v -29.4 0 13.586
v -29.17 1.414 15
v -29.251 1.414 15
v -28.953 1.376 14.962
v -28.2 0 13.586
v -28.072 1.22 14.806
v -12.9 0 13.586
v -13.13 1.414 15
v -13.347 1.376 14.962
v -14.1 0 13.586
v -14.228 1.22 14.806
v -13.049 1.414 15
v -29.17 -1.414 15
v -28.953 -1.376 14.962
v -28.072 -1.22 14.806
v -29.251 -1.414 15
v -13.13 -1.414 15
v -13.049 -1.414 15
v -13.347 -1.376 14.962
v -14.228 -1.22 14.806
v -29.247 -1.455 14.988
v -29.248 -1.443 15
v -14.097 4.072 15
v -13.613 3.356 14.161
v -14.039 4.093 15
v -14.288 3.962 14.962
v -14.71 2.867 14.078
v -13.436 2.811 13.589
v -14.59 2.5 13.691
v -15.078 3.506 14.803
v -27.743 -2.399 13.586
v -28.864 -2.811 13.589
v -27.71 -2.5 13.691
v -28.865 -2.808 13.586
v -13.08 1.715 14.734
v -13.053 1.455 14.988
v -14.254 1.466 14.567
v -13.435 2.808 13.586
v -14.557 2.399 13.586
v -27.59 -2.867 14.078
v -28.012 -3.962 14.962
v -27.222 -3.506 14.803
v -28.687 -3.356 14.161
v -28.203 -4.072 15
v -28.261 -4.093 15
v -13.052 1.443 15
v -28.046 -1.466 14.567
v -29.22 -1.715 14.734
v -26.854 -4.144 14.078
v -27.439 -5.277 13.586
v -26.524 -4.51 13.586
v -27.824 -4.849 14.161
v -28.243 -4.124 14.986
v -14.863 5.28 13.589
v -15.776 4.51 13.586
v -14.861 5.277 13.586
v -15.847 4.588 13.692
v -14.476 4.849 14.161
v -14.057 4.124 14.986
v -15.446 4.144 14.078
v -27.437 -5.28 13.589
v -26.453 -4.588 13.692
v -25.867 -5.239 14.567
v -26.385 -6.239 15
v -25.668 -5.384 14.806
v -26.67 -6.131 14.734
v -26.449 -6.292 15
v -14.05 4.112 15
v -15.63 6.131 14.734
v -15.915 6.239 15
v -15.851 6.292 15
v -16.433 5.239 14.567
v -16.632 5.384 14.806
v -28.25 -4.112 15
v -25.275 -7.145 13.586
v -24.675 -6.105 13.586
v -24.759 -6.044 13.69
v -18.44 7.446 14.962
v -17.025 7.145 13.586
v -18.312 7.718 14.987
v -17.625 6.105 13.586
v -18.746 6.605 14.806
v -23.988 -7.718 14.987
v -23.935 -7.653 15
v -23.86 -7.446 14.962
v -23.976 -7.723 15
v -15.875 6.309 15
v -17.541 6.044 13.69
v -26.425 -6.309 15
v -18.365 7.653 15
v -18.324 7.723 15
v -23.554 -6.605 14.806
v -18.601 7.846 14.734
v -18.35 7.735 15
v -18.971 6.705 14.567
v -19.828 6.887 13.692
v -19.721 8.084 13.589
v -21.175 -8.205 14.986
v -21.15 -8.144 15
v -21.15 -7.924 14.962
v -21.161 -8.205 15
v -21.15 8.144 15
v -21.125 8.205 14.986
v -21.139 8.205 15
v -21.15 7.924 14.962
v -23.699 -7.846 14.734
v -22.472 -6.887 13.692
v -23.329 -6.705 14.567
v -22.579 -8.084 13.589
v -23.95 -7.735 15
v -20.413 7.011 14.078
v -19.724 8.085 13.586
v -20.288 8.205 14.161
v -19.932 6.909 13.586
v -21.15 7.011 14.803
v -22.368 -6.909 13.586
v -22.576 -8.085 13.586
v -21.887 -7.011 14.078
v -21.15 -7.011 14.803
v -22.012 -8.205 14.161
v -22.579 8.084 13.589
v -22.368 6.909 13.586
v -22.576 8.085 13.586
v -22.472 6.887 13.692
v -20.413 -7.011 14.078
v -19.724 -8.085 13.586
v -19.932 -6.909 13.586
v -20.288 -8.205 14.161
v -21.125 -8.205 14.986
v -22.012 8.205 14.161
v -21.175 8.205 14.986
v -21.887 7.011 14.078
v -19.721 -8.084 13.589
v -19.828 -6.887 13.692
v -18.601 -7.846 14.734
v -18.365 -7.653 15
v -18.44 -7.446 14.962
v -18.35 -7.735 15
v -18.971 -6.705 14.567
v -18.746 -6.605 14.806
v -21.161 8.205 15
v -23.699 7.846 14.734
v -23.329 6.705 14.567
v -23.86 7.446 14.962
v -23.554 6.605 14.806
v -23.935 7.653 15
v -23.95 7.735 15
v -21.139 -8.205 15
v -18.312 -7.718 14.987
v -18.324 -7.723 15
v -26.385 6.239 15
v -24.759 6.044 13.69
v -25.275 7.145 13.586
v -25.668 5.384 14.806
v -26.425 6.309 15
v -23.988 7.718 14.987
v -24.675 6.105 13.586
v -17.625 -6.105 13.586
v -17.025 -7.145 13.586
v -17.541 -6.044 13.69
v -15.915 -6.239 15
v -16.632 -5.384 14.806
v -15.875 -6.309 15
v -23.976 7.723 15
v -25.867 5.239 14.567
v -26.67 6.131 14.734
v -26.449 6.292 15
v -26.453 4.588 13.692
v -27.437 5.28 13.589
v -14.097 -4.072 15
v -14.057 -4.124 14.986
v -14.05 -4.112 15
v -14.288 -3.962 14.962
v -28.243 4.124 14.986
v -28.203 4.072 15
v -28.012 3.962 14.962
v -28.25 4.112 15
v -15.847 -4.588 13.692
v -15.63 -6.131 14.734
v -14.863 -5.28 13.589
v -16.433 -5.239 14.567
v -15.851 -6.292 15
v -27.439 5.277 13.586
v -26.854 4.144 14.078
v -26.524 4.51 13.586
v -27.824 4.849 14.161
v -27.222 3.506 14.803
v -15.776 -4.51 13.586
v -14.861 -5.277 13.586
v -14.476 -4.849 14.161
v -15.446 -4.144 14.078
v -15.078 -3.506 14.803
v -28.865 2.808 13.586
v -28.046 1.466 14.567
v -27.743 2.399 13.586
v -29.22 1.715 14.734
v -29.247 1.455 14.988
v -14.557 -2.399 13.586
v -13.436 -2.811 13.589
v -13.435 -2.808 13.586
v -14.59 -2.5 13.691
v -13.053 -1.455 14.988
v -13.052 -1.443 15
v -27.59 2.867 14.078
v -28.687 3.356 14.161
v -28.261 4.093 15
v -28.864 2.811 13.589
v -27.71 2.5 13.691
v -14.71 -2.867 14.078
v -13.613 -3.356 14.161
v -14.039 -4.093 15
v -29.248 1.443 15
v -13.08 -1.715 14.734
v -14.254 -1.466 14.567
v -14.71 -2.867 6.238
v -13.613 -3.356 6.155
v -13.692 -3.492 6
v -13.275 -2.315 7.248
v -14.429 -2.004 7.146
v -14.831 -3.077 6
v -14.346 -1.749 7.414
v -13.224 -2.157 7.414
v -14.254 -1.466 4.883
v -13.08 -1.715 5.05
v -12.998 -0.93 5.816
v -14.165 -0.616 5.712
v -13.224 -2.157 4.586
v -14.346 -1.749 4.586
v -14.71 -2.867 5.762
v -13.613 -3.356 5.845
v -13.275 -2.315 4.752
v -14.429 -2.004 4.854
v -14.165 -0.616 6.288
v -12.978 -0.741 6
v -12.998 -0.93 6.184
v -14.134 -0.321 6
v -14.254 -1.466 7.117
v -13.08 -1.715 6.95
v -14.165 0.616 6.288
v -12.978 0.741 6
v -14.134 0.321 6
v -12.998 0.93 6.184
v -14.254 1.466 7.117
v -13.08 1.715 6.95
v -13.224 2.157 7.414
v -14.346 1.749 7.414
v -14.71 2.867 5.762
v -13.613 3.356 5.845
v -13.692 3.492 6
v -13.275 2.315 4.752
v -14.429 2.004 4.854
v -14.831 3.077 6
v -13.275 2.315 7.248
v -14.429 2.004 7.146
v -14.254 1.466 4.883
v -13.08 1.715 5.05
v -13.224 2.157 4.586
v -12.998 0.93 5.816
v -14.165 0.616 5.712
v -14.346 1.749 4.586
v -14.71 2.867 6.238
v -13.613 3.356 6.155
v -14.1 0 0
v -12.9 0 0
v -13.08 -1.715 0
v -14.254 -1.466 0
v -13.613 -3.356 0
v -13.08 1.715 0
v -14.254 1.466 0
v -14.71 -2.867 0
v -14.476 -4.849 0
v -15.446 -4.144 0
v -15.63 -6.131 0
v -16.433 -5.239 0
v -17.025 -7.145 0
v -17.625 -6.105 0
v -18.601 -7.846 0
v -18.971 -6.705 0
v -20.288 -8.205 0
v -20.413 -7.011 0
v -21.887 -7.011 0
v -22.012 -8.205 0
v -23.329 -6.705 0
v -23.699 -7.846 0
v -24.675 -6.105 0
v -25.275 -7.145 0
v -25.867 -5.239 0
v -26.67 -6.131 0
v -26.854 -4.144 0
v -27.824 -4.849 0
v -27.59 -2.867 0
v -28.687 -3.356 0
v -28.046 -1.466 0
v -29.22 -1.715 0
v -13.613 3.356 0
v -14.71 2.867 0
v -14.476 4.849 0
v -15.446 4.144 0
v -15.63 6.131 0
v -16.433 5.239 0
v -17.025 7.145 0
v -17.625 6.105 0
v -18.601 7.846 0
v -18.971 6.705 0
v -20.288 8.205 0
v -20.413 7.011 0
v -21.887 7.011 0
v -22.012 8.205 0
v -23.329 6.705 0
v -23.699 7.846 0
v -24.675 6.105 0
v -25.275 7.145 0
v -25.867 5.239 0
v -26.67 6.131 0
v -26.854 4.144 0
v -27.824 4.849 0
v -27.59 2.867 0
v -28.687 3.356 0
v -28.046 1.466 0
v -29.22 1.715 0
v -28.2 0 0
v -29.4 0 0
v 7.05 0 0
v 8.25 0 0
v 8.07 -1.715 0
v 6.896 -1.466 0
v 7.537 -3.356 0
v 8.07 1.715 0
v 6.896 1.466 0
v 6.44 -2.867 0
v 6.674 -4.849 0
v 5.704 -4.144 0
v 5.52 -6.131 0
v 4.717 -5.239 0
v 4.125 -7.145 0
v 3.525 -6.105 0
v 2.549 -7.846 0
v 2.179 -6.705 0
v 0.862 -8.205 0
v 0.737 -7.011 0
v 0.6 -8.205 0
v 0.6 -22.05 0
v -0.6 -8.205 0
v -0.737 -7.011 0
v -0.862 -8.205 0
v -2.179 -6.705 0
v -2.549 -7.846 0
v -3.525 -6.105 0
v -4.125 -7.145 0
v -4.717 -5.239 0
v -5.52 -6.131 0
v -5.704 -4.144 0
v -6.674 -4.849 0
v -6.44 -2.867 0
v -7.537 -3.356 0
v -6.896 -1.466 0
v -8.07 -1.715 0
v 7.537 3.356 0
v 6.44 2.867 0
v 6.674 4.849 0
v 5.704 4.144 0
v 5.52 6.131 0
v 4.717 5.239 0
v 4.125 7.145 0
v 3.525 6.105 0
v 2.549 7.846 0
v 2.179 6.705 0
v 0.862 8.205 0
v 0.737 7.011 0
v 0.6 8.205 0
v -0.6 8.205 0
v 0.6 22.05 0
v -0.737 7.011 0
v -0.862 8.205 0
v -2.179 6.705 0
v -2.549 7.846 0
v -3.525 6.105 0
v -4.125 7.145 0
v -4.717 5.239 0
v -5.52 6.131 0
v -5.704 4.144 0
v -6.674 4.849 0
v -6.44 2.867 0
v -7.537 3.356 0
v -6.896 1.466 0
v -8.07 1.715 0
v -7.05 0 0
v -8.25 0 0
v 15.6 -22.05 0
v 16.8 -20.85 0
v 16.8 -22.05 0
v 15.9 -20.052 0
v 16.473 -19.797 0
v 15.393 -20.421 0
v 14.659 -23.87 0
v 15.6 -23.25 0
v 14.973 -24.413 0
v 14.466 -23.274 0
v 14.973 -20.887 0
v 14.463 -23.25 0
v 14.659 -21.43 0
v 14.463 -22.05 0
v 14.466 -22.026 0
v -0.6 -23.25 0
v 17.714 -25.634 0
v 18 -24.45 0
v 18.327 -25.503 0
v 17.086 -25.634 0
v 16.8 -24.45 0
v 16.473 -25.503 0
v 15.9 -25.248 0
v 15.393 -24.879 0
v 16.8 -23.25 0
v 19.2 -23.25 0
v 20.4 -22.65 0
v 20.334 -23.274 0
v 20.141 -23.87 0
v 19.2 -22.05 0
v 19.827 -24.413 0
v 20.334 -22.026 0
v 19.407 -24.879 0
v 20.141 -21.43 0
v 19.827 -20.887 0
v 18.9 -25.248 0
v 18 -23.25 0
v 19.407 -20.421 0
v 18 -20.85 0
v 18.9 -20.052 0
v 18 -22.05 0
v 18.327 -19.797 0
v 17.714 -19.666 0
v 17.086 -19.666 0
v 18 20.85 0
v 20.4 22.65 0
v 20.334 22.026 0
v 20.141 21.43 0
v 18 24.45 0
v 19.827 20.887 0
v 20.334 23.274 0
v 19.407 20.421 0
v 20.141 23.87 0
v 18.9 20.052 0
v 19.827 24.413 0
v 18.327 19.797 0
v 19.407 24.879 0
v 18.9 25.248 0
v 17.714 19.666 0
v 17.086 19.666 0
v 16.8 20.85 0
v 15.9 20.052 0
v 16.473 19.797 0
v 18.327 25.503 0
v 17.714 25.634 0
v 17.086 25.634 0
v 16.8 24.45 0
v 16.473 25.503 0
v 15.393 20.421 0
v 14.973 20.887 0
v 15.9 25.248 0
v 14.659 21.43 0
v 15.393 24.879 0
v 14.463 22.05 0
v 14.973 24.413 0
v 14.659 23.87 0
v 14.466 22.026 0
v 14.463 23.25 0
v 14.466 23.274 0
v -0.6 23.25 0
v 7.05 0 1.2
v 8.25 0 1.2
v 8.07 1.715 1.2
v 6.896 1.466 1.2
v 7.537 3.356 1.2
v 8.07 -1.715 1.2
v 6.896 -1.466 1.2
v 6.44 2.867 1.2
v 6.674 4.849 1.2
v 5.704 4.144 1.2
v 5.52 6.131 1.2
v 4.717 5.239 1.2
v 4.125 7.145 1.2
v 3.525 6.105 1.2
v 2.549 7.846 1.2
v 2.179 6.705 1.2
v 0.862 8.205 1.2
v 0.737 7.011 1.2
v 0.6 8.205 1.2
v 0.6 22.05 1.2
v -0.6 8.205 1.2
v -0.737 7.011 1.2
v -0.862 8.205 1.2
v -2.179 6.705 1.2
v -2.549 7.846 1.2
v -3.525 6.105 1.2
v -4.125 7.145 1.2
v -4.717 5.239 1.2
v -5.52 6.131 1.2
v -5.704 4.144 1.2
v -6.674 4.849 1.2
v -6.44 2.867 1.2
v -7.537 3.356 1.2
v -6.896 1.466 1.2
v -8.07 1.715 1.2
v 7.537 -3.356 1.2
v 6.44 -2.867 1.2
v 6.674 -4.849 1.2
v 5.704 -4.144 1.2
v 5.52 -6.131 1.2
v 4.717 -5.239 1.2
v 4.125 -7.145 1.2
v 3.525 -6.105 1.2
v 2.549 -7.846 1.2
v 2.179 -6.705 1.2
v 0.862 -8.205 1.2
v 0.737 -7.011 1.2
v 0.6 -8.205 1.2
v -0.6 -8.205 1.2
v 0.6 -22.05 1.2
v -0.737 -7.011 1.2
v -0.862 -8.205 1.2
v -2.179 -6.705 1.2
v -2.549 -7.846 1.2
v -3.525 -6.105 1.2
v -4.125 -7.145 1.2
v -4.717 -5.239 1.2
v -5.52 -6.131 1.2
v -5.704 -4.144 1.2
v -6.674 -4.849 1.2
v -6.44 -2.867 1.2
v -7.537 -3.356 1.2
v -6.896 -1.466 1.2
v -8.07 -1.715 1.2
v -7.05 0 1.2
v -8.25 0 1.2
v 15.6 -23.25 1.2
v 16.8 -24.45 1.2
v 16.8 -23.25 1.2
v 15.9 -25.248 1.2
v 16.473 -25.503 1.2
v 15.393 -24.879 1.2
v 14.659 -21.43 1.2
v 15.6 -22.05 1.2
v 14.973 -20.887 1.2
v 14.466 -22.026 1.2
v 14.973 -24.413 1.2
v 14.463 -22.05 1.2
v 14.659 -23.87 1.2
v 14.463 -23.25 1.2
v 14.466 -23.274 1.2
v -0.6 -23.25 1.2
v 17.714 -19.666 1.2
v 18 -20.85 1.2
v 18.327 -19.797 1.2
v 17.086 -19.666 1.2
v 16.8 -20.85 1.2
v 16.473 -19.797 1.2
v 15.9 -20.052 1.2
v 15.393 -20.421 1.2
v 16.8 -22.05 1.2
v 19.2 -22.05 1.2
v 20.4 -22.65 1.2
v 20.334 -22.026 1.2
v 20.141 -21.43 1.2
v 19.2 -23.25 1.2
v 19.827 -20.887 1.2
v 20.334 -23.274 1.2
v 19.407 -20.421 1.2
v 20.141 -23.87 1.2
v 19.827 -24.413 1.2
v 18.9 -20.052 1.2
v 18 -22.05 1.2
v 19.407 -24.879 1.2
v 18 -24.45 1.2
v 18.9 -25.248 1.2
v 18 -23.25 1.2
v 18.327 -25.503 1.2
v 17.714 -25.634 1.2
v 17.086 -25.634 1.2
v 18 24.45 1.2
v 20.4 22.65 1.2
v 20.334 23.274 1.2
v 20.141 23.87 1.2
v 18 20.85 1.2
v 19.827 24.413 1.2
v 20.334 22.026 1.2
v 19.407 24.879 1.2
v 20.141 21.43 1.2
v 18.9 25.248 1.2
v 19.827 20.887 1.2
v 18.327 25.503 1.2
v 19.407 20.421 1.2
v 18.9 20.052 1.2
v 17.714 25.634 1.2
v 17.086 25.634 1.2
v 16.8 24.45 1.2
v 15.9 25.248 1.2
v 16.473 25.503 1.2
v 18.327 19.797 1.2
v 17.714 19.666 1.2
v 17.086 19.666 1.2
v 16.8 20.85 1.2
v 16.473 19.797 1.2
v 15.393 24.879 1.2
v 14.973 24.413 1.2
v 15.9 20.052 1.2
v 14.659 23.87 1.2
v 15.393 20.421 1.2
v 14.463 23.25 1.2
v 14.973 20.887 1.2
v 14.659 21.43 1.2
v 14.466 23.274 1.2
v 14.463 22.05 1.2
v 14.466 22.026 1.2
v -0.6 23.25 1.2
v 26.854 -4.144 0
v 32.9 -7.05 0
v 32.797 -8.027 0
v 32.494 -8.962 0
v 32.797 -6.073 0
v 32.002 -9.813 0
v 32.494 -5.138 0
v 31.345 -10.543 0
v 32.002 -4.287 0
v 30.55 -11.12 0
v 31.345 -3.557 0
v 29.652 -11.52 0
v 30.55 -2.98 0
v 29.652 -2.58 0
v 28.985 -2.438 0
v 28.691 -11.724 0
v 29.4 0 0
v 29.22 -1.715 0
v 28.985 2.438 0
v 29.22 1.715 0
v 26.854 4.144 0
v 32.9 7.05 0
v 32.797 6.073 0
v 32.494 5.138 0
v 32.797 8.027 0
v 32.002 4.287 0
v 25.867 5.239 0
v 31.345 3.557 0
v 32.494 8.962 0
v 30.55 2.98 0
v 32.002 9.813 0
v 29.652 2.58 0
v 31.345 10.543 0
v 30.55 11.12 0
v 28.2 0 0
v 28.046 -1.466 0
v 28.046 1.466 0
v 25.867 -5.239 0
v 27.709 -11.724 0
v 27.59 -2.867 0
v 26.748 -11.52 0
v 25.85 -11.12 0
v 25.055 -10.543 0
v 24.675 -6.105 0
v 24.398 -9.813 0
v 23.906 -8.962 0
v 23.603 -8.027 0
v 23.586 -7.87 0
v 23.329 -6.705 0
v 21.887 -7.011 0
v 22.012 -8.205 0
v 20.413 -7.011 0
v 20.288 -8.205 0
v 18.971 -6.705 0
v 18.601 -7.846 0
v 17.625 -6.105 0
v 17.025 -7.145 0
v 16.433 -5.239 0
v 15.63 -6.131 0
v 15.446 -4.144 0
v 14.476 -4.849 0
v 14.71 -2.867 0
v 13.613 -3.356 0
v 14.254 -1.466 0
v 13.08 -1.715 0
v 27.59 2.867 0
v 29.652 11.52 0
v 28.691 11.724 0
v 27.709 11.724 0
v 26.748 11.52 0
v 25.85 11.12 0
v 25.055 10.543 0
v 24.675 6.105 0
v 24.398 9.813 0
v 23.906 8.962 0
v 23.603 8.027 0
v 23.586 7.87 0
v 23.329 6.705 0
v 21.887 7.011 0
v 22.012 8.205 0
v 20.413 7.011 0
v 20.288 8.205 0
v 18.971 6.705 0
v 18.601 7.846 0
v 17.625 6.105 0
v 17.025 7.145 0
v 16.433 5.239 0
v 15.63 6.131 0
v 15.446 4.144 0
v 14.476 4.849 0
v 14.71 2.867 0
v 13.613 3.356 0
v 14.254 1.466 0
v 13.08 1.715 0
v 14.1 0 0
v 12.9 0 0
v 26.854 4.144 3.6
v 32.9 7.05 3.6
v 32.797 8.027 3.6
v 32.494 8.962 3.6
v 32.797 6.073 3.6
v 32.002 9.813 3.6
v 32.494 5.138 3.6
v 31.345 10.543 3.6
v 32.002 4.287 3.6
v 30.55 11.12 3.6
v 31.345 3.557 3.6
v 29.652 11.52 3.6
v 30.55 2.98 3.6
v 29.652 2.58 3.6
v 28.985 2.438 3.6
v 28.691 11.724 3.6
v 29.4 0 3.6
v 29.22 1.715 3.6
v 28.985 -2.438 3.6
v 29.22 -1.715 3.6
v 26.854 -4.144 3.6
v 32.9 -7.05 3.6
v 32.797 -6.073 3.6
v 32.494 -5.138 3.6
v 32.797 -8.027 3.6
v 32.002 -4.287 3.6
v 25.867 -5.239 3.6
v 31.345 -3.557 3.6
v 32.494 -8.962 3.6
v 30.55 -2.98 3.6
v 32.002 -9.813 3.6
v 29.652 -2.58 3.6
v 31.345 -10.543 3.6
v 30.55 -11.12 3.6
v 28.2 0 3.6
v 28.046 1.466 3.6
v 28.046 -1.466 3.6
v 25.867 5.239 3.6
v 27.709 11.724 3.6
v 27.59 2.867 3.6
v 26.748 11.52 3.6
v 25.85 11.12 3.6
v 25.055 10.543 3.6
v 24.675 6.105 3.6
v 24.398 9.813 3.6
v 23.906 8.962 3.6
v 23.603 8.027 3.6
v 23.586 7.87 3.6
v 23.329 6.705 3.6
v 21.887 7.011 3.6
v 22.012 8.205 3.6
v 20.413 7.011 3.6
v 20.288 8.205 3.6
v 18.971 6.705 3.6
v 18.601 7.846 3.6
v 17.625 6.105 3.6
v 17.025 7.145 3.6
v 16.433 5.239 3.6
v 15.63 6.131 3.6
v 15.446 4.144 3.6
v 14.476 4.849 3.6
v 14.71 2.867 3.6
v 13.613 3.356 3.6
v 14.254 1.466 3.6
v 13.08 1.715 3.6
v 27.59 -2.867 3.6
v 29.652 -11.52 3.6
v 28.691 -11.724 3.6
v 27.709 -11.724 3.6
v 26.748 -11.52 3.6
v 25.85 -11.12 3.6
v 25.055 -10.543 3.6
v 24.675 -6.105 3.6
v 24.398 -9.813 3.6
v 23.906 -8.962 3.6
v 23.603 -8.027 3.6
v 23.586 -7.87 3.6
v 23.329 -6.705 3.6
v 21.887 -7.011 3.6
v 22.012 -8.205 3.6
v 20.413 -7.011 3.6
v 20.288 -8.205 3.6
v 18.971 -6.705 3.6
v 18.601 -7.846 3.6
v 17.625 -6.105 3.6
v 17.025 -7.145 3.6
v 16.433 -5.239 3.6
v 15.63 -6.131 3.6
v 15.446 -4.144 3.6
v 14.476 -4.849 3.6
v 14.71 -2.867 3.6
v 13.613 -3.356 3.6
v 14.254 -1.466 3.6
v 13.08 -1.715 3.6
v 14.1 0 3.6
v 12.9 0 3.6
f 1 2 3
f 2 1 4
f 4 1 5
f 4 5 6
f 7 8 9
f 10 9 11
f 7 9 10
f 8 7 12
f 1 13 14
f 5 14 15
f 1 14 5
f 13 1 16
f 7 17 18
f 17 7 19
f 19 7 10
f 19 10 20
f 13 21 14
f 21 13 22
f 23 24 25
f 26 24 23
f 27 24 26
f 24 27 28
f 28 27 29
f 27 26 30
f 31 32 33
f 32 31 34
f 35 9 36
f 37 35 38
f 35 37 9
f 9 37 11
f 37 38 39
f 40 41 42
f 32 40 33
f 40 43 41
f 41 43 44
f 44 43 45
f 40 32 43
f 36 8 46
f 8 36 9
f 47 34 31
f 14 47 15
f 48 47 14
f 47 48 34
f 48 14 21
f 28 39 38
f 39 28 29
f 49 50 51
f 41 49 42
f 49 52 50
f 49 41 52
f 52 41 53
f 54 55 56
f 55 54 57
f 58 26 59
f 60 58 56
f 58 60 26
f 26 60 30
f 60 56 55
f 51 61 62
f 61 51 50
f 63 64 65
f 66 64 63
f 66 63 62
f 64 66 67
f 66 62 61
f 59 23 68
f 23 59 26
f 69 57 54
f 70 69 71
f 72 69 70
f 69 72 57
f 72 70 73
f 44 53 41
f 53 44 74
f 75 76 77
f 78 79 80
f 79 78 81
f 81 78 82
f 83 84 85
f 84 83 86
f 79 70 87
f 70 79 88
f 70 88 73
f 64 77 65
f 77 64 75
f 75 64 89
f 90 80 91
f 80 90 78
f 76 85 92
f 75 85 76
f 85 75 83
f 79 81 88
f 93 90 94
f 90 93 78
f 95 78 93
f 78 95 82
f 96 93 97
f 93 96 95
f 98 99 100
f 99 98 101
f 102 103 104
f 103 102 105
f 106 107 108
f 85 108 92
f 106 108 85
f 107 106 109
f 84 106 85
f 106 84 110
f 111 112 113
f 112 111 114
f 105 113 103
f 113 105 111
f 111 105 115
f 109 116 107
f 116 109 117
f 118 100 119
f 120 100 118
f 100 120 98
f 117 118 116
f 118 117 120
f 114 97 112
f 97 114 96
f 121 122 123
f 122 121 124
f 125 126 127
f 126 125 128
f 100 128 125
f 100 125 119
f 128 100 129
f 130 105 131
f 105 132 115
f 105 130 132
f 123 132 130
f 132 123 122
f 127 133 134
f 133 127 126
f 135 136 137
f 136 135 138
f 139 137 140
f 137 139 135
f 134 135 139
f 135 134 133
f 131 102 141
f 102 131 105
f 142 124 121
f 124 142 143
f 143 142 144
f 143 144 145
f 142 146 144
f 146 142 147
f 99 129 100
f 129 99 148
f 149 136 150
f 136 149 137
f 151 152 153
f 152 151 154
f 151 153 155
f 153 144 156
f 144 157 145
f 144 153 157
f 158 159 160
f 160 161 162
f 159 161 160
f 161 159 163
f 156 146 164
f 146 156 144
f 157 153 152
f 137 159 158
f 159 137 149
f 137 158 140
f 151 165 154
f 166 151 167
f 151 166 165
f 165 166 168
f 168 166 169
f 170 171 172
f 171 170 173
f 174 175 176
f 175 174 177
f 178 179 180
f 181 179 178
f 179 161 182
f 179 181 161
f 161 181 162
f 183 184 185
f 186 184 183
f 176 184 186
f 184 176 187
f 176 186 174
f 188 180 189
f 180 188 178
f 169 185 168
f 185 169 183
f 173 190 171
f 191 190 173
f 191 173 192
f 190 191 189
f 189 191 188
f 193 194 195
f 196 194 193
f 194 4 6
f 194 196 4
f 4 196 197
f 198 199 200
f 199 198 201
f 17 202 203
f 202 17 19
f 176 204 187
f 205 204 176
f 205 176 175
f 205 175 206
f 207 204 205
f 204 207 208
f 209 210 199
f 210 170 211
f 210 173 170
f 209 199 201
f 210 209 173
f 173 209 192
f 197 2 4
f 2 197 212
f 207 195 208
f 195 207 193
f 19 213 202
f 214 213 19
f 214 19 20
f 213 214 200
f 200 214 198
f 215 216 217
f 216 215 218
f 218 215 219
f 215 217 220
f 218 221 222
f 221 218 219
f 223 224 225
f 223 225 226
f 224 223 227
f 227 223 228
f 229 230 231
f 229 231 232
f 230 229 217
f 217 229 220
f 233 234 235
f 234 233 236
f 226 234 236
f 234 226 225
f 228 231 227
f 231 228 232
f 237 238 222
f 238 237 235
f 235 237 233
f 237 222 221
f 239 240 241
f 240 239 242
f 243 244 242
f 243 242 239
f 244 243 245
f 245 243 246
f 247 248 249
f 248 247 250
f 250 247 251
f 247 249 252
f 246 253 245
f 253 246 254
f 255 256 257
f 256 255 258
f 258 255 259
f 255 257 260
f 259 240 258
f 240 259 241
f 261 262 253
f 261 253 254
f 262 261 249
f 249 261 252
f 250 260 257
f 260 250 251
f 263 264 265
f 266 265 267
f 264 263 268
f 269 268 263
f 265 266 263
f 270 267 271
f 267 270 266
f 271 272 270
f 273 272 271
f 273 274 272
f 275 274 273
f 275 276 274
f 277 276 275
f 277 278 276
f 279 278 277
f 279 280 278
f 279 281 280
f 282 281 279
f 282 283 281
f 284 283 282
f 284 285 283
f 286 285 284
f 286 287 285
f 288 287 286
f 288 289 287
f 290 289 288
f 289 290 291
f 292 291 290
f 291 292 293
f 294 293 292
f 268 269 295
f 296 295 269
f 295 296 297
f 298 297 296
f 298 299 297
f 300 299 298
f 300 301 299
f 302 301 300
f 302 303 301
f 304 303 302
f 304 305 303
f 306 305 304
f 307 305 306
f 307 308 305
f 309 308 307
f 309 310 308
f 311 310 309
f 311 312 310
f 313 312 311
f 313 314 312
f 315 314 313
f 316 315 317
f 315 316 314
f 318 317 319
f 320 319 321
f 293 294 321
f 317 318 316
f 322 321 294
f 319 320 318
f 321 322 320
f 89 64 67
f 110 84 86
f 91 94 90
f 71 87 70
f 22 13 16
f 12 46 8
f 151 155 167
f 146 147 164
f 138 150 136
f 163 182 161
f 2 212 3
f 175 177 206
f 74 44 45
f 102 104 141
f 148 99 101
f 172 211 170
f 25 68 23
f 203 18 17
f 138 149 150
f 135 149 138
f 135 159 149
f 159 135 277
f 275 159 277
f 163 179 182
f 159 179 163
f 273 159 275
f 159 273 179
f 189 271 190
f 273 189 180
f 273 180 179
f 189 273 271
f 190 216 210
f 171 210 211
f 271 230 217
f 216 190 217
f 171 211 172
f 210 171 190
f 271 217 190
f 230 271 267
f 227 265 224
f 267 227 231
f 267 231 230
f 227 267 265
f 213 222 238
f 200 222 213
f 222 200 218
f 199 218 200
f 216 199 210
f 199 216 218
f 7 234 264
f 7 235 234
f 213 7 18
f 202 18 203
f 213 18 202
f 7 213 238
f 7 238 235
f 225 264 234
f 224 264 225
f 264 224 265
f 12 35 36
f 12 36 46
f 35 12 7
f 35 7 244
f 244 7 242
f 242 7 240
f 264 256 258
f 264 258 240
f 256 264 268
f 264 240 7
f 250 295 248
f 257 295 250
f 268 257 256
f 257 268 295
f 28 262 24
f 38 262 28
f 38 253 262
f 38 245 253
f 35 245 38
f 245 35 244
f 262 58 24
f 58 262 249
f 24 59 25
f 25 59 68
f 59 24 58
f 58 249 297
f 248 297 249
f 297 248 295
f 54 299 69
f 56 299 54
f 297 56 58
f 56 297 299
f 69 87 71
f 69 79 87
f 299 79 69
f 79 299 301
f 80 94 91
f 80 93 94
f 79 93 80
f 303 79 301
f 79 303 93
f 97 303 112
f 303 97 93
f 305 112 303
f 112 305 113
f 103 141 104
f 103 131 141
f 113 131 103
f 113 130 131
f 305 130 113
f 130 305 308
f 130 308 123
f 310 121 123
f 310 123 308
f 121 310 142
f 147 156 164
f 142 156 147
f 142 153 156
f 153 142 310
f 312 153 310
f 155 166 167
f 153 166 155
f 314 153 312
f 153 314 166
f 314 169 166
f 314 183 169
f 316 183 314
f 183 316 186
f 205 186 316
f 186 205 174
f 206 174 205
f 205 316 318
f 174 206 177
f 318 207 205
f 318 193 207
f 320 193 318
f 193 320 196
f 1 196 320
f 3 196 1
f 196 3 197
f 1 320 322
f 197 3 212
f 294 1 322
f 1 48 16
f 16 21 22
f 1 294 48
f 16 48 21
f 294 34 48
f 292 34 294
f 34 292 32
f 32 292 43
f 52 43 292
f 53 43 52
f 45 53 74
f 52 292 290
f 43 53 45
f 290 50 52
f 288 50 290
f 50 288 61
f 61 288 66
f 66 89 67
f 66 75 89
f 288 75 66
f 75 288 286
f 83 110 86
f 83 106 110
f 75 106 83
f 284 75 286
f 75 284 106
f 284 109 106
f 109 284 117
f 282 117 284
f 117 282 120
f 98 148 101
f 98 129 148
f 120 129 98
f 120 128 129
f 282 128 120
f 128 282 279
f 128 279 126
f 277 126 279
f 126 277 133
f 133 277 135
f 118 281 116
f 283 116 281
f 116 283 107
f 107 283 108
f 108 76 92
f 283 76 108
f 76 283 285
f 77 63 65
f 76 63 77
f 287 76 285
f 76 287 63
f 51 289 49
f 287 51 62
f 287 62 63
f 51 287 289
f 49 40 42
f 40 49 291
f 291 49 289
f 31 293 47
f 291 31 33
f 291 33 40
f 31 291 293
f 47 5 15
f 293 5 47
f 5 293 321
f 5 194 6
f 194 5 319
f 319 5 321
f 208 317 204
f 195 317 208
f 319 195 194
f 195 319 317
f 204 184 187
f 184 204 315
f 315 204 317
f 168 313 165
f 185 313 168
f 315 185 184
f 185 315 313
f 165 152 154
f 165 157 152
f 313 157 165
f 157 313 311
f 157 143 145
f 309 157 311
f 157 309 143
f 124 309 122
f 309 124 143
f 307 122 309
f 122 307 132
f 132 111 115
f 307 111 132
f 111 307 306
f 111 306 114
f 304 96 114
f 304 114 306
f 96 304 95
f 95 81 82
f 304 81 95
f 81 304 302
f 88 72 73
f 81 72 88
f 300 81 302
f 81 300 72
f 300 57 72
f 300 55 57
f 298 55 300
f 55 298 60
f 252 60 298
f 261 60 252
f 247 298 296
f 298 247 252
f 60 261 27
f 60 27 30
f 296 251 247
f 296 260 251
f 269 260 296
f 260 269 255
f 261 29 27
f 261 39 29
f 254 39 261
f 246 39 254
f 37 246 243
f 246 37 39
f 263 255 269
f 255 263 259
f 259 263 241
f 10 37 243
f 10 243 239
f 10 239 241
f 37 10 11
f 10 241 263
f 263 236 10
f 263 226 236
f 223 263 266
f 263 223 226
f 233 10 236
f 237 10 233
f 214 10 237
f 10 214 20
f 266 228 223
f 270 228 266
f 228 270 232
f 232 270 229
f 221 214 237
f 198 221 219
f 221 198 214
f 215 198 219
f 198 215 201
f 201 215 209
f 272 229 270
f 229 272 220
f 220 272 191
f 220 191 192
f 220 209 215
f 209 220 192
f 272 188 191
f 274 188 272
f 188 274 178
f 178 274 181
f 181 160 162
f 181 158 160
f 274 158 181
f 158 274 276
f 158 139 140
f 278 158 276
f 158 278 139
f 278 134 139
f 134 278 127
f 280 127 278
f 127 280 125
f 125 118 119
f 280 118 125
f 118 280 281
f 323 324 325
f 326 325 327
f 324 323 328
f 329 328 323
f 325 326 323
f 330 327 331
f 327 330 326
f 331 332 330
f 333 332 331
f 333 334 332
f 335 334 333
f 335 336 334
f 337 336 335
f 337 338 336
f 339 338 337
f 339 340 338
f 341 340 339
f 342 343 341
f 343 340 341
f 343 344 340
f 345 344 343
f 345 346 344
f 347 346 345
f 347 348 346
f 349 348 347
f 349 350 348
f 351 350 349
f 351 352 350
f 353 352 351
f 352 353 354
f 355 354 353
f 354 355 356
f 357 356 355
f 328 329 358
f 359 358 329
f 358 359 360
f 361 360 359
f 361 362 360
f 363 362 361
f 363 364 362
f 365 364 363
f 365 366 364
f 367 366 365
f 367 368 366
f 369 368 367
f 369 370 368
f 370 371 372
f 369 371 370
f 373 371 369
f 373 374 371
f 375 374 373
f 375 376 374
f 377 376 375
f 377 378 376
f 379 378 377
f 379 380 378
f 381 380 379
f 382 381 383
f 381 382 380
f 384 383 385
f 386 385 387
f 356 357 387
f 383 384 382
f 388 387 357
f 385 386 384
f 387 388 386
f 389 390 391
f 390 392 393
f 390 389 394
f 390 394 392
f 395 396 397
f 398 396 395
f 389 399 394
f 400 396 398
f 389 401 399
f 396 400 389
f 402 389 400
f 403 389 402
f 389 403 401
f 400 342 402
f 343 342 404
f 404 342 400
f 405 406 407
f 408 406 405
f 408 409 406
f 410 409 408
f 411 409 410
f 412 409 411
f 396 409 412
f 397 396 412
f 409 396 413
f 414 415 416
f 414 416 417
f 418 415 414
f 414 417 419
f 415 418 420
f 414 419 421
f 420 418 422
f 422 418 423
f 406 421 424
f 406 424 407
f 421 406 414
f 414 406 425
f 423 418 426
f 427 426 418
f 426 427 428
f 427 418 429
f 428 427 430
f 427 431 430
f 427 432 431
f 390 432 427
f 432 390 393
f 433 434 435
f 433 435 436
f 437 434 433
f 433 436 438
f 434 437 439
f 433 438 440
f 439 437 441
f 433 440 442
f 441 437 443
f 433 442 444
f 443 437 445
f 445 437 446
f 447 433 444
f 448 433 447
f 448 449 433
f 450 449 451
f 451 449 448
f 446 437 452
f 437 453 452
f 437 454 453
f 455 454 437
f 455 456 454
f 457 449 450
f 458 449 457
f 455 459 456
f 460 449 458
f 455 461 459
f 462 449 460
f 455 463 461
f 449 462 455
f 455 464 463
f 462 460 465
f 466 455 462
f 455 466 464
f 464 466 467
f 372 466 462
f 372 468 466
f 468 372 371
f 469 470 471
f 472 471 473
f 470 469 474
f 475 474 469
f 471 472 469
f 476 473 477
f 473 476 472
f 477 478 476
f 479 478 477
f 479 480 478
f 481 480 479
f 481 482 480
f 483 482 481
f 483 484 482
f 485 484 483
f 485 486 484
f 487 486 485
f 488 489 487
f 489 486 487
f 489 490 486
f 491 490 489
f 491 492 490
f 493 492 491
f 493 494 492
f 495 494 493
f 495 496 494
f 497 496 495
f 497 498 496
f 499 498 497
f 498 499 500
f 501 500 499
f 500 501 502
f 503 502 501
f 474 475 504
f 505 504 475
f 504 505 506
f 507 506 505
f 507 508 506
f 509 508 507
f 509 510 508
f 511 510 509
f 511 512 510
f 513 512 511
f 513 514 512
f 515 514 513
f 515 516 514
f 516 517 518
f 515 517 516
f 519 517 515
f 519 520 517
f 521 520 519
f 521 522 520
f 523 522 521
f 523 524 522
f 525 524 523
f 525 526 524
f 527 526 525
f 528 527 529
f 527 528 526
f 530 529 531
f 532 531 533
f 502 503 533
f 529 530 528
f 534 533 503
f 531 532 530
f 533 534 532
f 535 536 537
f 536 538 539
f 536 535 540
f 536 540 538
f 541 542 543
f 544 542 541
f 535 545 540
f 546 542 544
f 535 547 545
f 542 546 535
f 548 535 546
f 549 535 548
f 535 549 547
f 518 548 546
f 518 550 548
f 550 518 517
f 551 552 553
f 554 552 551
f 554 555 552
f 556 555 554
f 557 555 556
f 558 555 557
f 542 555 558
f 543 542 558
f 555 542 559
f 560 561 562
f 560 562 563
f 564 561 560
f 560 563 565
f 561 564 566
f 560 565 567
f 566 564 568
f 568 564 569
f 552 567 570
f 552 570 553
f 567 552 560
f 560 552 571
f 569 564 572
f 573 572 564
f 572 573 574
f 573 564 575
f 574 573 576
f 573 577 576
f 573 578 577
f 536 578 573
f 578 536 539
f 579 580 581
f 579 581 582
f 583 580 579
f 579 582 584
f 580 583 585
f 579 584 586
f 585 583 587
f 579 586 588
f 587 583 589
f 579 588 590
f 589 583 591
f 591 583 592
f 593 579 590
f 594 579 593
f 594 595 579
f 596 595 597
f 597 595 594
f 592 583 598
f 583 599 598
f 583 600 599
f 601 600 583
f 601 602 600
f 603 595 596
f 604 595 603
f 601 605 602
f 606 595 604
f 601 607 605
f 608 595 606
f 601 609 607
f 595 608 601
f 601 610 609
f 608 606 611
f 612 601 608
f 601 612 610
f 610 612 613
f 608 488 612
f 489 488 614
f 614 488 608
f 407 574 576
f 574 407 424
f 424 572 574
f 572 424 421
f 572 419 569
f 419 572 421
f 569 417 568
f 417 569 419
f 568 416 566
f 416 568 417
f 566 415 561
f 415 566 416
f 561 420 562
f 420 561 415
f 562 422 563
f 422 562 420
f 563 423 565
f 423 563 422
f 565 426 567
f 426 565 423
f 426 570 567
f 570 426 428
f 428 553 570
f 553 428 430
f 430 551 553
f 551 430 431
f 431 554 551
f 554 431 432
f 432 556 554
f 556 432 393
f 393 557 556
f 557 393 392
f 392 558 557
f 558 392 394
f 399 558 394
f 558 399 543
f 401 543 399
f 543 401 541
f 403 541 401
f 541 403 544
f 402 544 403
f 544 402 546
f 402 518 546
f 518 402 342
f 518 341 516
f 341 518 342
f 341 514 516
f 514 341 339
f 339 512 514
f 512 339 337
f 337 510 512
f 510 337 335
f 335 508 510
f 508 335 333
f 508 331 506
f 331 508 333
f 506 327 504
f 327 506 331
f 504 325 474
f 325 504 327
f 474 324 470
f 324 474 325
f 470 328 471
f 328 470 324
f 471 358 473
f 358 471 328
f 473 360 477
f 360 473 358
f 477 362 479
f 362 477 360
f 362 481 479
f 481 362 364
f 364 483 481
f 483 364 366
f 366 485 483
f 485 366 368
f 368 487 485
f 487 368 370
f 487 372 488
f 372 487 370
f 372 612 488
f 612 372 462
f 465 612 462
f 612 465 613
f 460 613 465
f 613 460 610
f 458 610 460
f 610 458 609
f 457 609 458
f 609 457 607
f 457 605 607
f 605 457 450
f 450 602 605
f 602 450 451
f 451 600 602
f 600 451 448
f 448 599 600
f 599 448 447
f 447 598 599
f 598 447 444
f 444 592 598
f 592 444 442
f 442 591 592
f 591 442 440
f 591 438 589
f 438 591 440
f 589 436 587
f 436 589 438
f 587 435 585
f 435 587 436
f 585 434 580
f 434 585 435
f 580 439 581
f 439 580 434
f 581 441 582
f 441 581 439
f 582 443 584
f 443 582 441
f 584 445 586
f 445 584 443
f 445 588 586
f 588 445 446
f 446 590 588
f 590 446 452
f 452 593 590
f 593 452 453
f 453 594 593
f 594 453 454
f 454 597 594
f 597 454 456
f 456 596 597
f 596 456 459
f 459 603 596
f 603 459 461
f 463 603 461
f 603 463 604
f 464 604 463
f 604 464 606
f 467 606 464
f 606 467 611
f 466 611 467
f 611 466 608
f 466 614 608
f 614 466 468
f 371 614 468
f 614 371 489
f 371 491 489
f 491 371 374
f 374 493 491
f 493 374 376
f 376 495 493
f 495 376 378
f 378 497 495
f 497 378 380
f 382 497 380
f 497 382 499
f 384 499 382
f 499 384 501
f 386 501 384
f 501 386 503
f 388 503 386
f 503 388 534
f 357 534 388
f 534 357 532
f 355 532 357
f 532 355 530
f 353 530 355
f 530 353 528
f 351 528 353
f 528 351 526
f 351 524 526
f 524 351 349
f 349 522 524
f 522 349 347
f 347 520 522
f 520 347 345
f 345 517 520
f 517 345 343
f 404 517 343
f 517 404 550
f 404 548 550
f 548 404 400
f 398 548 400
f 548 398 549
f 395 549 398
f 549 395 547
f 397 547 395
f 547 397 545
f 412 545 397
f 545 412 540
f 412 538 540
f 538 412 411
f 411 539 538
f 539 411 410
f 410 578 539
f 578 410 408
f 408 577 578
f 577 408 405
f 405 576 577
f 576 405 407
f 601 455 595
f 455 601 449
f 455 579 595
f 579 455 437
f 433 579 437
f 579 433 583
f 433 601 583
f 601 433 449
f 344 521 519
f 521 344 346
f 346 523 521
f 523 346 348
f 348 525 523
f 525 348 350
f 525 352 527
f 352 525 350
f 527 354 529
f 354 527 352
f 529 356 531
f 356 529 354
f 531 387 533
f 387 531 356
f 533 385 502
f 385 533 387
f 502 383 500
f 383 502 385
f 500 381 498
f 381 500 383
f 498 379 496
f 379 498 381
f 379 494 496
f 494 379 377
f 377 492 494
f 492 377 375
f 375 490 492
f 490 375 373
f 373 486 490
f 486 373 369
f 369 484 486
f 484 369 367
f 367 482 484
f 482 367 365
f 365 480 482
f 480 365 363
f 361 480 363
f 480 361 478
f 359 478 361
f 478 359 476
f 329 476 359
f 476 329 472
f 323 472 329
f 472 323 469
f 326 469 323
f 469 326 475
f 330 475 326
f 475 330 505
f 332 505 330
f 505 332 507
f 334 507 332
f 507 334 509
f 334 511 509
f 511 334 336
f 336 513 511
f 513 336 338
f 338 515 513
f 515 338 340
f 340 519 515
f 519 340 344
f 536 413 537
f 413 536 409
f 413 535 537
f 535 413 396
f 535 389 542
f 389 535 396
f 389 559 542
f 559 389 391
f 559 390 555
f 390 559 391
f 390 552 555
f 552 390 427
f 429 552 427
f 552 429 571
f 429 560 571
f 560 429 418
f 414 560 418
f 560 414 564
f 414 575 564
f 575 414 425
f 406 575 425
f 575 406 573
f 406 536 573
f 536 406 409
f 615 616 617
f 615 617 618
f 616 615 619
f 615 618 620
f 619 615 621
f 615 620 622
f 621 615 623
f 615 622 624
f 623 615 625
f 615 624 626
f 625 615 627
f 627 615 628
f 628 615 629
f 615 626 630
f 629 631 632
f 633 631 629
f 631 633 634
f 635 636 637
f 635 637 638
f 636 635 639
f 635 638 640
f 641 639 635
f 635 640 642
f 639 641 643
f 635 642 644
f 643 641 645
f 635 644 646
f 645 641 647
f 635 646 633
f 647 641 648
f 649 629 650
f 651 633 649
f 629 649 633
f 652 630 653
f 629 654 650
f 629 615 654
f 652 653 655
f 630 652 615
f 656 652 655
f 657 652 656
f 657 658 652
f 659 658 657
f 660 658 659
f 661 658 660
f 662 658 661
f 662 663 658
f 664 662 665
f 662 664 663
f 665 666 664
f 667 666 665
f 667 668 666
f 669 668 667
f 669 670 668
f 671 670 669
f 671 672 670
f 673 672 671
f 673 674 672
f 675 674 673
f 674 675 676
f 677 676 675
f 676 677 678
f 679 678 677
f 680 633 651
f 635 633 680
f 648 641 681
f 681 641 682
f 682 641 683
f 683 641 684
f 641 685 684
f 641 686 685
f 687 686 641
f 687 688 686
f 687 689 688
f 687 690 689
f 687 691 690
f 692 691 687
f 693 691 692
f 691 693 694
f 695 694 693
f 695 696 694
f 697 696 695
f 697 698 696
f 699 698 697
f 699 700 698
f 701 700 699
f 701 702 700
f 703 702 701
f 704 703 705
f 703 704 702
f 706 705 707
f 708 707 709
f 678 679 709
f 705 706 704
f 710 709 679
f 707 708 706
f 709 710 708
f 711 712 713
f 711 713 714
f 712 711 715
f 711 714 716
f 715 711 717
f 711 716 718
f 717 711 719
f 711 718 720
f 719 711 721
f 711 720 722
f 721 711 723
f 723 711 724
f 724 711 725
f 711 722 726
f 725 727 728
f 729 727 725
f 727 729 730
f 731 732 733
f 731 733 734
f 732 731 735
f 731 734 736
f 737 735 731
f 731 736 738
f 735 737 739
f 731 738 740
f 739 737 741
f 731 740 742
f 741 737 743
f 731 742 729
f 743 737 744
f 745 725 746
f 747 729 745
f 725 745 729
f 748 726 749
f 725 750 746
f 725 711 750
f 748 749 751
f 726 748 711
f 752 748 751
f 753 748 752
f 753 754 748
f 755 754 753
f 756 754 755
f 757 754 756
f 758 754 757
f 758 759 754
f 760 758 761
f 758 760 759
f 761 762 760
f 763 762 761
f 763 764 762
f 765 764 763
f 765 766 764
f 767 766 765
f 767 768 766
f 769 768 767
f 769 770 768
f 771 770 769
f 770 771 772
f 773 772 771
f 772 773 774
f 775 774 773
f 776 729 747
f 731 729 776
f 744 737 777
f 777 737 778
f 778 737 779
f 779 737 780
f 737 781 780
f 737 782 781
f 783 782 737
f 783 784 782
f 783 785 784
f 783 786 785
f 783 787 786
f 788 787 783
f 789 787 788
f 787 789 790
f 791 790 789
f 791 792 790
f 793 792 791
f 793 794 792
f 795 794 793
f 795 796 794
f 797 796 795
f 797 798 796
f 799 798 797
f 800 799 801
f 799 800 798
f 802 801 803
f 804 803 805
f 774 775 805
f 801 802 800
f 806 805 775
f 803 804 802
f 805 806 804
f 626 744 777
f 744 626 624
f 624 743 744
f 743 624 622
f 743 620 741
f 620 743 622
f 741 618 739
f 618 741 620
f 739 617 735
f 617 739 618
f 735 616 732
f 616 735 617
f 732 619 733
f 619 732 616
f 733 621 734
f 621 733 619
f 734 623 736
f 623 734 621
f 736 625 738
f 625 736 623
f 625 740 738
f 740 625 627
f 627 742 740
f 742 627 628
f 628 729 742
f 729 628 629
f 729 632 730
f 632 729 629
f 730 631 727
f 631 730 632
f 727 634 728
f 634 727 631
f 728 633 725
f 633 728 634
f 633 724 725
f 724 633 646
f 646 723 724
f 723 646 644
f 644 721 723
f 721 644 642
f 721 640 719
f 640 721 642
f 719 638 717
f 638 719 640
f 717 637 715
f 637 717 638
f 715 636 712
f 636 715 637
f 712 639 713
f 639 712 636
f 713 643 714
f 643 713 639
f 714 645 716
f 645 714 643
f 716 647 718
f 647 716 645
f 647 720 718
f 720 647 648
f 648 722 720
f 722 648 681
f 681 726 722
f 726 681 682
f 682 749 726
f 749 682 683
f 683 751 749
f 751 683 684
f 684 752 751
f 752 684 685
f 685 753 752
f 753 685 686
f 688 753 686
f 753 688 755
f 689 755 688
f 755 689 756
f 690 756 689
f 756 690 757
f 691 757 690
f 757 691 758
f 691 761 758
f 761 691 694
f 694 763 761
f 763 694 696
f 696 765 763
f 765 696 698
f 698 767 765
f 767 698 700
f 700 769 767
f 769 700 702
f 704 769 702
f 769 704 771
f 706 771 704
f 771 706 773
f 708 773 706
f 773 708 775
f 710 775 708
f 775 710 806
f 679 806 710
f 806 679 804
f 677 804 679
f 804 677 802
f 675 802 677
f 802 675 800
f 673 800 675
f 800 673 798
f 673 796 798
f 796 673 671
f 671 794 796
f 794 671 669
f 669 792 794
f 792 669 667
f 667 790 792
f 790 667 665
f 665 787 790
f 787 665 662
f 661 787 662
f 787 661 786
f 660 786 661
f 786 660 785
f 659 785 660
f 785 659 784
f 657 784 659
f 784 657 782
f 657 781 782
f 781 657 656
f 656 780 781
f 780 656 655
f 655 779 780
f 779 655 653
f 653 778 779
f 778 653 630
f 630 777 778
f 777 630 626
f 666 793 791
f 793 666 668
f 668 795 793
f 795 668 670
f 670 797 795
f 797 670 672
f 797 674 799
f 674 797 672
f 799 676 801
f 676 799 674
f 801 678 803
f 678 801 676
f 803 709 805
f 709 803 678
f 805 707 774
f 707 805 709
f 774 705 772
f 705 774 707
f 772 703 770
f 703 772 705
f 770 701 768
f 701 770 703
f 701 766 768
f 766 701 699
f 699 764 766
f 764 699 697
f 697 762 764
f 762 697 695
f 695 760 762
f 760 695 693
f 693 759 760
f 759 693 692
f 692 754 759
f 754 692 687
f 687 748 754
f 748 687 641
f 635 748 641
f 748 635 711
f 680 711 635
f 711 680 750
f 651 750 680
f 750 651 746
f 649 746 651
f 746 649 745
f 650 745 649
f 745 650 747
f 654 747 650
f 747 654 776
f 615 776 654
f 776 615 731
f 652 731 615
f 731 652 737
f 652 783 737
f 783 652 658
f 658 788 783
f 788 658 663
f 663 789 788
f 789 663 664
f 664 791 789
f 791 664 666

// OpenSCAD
battery_diameter = 14.1;
thickness = 1.2;
arm_length = 15;
$fn=30;

// the arms
linear_extrude(thickness) {
    difference() {
        union() {
            circle(battery_diameter / 2 + thickness);
            square(
                [
                    thickness,
                    battery_diameter + arm_length * 2 + thickness * 2
                ], 
                true
            );
            translate([0, battery_diameter / 2 + arm_length]) {
                square([arm_length, thickness]);
                translate([arm_length + thickness * 2, thickness / 2]) {
                    difference() {
                        circle(thickness * 2.5);
                        square([thickness, thickness * 3], true);
                    }
                }            }
            translate([
                0, 
                0 - (battery_diameter / 2 + arm_length + thickness)
            ]) {
                square([arm_length, thickness]);
                translate([arm_length + thickness * 2, thickness / 2]) {
                    difference() {
                        circle(thickness * 2.5);
                        square([thickness, thickness * 3], true);
                        square([thickness * 3, thickness], true);
                    }
                }
            }
        }
        circle(battery_diameter / 2);
    }
}

// the feet
translate([battery_diameter * 1.5, 0, 0]) {
    linear_extrude(thickness * 3) {
        difference() {
            union() {
                circle(battery_diameter / 2 + thickness);
                translate([
                    battery_diameter / 2, 
                    battery_diameter / 2, 0
                ]) {
                    circle(battery_diameter / 3);
                }
                translate([
                    battery_diameter / 2, 
                    0 - battery_diameter / 2, 0
                ]) {
                    circle(battery_diameter / 3);
                }
            }
            circle(battery_diameter / 2);
        }
    }
}

// head
translate([0 - battery_diameter * 1.5, 0, 0]) {
    difference() {
        linear_extrude(15) {
            difference() {
                union() {
                    circle(battery_diameter / 2 + thickness);
                }
                circle(battery_diameter / 2);
            }
        }
        // hair
        translate([0,0,15]) {
            for (spin = [0:20:180]) {
                rotate([45, 0, spin]) {
                    cube([battery_diameter + thickness * 2, 2, 2], true);
                }
            }
        }
        translate([2,0,6]) {
            for (spin = [-20:40:20]) {
                rotate([45, 0, spin]) {
                    cube([battery_diameter + thickness * 2, 2, 2], true);
                }
            }
        }
    }
}
